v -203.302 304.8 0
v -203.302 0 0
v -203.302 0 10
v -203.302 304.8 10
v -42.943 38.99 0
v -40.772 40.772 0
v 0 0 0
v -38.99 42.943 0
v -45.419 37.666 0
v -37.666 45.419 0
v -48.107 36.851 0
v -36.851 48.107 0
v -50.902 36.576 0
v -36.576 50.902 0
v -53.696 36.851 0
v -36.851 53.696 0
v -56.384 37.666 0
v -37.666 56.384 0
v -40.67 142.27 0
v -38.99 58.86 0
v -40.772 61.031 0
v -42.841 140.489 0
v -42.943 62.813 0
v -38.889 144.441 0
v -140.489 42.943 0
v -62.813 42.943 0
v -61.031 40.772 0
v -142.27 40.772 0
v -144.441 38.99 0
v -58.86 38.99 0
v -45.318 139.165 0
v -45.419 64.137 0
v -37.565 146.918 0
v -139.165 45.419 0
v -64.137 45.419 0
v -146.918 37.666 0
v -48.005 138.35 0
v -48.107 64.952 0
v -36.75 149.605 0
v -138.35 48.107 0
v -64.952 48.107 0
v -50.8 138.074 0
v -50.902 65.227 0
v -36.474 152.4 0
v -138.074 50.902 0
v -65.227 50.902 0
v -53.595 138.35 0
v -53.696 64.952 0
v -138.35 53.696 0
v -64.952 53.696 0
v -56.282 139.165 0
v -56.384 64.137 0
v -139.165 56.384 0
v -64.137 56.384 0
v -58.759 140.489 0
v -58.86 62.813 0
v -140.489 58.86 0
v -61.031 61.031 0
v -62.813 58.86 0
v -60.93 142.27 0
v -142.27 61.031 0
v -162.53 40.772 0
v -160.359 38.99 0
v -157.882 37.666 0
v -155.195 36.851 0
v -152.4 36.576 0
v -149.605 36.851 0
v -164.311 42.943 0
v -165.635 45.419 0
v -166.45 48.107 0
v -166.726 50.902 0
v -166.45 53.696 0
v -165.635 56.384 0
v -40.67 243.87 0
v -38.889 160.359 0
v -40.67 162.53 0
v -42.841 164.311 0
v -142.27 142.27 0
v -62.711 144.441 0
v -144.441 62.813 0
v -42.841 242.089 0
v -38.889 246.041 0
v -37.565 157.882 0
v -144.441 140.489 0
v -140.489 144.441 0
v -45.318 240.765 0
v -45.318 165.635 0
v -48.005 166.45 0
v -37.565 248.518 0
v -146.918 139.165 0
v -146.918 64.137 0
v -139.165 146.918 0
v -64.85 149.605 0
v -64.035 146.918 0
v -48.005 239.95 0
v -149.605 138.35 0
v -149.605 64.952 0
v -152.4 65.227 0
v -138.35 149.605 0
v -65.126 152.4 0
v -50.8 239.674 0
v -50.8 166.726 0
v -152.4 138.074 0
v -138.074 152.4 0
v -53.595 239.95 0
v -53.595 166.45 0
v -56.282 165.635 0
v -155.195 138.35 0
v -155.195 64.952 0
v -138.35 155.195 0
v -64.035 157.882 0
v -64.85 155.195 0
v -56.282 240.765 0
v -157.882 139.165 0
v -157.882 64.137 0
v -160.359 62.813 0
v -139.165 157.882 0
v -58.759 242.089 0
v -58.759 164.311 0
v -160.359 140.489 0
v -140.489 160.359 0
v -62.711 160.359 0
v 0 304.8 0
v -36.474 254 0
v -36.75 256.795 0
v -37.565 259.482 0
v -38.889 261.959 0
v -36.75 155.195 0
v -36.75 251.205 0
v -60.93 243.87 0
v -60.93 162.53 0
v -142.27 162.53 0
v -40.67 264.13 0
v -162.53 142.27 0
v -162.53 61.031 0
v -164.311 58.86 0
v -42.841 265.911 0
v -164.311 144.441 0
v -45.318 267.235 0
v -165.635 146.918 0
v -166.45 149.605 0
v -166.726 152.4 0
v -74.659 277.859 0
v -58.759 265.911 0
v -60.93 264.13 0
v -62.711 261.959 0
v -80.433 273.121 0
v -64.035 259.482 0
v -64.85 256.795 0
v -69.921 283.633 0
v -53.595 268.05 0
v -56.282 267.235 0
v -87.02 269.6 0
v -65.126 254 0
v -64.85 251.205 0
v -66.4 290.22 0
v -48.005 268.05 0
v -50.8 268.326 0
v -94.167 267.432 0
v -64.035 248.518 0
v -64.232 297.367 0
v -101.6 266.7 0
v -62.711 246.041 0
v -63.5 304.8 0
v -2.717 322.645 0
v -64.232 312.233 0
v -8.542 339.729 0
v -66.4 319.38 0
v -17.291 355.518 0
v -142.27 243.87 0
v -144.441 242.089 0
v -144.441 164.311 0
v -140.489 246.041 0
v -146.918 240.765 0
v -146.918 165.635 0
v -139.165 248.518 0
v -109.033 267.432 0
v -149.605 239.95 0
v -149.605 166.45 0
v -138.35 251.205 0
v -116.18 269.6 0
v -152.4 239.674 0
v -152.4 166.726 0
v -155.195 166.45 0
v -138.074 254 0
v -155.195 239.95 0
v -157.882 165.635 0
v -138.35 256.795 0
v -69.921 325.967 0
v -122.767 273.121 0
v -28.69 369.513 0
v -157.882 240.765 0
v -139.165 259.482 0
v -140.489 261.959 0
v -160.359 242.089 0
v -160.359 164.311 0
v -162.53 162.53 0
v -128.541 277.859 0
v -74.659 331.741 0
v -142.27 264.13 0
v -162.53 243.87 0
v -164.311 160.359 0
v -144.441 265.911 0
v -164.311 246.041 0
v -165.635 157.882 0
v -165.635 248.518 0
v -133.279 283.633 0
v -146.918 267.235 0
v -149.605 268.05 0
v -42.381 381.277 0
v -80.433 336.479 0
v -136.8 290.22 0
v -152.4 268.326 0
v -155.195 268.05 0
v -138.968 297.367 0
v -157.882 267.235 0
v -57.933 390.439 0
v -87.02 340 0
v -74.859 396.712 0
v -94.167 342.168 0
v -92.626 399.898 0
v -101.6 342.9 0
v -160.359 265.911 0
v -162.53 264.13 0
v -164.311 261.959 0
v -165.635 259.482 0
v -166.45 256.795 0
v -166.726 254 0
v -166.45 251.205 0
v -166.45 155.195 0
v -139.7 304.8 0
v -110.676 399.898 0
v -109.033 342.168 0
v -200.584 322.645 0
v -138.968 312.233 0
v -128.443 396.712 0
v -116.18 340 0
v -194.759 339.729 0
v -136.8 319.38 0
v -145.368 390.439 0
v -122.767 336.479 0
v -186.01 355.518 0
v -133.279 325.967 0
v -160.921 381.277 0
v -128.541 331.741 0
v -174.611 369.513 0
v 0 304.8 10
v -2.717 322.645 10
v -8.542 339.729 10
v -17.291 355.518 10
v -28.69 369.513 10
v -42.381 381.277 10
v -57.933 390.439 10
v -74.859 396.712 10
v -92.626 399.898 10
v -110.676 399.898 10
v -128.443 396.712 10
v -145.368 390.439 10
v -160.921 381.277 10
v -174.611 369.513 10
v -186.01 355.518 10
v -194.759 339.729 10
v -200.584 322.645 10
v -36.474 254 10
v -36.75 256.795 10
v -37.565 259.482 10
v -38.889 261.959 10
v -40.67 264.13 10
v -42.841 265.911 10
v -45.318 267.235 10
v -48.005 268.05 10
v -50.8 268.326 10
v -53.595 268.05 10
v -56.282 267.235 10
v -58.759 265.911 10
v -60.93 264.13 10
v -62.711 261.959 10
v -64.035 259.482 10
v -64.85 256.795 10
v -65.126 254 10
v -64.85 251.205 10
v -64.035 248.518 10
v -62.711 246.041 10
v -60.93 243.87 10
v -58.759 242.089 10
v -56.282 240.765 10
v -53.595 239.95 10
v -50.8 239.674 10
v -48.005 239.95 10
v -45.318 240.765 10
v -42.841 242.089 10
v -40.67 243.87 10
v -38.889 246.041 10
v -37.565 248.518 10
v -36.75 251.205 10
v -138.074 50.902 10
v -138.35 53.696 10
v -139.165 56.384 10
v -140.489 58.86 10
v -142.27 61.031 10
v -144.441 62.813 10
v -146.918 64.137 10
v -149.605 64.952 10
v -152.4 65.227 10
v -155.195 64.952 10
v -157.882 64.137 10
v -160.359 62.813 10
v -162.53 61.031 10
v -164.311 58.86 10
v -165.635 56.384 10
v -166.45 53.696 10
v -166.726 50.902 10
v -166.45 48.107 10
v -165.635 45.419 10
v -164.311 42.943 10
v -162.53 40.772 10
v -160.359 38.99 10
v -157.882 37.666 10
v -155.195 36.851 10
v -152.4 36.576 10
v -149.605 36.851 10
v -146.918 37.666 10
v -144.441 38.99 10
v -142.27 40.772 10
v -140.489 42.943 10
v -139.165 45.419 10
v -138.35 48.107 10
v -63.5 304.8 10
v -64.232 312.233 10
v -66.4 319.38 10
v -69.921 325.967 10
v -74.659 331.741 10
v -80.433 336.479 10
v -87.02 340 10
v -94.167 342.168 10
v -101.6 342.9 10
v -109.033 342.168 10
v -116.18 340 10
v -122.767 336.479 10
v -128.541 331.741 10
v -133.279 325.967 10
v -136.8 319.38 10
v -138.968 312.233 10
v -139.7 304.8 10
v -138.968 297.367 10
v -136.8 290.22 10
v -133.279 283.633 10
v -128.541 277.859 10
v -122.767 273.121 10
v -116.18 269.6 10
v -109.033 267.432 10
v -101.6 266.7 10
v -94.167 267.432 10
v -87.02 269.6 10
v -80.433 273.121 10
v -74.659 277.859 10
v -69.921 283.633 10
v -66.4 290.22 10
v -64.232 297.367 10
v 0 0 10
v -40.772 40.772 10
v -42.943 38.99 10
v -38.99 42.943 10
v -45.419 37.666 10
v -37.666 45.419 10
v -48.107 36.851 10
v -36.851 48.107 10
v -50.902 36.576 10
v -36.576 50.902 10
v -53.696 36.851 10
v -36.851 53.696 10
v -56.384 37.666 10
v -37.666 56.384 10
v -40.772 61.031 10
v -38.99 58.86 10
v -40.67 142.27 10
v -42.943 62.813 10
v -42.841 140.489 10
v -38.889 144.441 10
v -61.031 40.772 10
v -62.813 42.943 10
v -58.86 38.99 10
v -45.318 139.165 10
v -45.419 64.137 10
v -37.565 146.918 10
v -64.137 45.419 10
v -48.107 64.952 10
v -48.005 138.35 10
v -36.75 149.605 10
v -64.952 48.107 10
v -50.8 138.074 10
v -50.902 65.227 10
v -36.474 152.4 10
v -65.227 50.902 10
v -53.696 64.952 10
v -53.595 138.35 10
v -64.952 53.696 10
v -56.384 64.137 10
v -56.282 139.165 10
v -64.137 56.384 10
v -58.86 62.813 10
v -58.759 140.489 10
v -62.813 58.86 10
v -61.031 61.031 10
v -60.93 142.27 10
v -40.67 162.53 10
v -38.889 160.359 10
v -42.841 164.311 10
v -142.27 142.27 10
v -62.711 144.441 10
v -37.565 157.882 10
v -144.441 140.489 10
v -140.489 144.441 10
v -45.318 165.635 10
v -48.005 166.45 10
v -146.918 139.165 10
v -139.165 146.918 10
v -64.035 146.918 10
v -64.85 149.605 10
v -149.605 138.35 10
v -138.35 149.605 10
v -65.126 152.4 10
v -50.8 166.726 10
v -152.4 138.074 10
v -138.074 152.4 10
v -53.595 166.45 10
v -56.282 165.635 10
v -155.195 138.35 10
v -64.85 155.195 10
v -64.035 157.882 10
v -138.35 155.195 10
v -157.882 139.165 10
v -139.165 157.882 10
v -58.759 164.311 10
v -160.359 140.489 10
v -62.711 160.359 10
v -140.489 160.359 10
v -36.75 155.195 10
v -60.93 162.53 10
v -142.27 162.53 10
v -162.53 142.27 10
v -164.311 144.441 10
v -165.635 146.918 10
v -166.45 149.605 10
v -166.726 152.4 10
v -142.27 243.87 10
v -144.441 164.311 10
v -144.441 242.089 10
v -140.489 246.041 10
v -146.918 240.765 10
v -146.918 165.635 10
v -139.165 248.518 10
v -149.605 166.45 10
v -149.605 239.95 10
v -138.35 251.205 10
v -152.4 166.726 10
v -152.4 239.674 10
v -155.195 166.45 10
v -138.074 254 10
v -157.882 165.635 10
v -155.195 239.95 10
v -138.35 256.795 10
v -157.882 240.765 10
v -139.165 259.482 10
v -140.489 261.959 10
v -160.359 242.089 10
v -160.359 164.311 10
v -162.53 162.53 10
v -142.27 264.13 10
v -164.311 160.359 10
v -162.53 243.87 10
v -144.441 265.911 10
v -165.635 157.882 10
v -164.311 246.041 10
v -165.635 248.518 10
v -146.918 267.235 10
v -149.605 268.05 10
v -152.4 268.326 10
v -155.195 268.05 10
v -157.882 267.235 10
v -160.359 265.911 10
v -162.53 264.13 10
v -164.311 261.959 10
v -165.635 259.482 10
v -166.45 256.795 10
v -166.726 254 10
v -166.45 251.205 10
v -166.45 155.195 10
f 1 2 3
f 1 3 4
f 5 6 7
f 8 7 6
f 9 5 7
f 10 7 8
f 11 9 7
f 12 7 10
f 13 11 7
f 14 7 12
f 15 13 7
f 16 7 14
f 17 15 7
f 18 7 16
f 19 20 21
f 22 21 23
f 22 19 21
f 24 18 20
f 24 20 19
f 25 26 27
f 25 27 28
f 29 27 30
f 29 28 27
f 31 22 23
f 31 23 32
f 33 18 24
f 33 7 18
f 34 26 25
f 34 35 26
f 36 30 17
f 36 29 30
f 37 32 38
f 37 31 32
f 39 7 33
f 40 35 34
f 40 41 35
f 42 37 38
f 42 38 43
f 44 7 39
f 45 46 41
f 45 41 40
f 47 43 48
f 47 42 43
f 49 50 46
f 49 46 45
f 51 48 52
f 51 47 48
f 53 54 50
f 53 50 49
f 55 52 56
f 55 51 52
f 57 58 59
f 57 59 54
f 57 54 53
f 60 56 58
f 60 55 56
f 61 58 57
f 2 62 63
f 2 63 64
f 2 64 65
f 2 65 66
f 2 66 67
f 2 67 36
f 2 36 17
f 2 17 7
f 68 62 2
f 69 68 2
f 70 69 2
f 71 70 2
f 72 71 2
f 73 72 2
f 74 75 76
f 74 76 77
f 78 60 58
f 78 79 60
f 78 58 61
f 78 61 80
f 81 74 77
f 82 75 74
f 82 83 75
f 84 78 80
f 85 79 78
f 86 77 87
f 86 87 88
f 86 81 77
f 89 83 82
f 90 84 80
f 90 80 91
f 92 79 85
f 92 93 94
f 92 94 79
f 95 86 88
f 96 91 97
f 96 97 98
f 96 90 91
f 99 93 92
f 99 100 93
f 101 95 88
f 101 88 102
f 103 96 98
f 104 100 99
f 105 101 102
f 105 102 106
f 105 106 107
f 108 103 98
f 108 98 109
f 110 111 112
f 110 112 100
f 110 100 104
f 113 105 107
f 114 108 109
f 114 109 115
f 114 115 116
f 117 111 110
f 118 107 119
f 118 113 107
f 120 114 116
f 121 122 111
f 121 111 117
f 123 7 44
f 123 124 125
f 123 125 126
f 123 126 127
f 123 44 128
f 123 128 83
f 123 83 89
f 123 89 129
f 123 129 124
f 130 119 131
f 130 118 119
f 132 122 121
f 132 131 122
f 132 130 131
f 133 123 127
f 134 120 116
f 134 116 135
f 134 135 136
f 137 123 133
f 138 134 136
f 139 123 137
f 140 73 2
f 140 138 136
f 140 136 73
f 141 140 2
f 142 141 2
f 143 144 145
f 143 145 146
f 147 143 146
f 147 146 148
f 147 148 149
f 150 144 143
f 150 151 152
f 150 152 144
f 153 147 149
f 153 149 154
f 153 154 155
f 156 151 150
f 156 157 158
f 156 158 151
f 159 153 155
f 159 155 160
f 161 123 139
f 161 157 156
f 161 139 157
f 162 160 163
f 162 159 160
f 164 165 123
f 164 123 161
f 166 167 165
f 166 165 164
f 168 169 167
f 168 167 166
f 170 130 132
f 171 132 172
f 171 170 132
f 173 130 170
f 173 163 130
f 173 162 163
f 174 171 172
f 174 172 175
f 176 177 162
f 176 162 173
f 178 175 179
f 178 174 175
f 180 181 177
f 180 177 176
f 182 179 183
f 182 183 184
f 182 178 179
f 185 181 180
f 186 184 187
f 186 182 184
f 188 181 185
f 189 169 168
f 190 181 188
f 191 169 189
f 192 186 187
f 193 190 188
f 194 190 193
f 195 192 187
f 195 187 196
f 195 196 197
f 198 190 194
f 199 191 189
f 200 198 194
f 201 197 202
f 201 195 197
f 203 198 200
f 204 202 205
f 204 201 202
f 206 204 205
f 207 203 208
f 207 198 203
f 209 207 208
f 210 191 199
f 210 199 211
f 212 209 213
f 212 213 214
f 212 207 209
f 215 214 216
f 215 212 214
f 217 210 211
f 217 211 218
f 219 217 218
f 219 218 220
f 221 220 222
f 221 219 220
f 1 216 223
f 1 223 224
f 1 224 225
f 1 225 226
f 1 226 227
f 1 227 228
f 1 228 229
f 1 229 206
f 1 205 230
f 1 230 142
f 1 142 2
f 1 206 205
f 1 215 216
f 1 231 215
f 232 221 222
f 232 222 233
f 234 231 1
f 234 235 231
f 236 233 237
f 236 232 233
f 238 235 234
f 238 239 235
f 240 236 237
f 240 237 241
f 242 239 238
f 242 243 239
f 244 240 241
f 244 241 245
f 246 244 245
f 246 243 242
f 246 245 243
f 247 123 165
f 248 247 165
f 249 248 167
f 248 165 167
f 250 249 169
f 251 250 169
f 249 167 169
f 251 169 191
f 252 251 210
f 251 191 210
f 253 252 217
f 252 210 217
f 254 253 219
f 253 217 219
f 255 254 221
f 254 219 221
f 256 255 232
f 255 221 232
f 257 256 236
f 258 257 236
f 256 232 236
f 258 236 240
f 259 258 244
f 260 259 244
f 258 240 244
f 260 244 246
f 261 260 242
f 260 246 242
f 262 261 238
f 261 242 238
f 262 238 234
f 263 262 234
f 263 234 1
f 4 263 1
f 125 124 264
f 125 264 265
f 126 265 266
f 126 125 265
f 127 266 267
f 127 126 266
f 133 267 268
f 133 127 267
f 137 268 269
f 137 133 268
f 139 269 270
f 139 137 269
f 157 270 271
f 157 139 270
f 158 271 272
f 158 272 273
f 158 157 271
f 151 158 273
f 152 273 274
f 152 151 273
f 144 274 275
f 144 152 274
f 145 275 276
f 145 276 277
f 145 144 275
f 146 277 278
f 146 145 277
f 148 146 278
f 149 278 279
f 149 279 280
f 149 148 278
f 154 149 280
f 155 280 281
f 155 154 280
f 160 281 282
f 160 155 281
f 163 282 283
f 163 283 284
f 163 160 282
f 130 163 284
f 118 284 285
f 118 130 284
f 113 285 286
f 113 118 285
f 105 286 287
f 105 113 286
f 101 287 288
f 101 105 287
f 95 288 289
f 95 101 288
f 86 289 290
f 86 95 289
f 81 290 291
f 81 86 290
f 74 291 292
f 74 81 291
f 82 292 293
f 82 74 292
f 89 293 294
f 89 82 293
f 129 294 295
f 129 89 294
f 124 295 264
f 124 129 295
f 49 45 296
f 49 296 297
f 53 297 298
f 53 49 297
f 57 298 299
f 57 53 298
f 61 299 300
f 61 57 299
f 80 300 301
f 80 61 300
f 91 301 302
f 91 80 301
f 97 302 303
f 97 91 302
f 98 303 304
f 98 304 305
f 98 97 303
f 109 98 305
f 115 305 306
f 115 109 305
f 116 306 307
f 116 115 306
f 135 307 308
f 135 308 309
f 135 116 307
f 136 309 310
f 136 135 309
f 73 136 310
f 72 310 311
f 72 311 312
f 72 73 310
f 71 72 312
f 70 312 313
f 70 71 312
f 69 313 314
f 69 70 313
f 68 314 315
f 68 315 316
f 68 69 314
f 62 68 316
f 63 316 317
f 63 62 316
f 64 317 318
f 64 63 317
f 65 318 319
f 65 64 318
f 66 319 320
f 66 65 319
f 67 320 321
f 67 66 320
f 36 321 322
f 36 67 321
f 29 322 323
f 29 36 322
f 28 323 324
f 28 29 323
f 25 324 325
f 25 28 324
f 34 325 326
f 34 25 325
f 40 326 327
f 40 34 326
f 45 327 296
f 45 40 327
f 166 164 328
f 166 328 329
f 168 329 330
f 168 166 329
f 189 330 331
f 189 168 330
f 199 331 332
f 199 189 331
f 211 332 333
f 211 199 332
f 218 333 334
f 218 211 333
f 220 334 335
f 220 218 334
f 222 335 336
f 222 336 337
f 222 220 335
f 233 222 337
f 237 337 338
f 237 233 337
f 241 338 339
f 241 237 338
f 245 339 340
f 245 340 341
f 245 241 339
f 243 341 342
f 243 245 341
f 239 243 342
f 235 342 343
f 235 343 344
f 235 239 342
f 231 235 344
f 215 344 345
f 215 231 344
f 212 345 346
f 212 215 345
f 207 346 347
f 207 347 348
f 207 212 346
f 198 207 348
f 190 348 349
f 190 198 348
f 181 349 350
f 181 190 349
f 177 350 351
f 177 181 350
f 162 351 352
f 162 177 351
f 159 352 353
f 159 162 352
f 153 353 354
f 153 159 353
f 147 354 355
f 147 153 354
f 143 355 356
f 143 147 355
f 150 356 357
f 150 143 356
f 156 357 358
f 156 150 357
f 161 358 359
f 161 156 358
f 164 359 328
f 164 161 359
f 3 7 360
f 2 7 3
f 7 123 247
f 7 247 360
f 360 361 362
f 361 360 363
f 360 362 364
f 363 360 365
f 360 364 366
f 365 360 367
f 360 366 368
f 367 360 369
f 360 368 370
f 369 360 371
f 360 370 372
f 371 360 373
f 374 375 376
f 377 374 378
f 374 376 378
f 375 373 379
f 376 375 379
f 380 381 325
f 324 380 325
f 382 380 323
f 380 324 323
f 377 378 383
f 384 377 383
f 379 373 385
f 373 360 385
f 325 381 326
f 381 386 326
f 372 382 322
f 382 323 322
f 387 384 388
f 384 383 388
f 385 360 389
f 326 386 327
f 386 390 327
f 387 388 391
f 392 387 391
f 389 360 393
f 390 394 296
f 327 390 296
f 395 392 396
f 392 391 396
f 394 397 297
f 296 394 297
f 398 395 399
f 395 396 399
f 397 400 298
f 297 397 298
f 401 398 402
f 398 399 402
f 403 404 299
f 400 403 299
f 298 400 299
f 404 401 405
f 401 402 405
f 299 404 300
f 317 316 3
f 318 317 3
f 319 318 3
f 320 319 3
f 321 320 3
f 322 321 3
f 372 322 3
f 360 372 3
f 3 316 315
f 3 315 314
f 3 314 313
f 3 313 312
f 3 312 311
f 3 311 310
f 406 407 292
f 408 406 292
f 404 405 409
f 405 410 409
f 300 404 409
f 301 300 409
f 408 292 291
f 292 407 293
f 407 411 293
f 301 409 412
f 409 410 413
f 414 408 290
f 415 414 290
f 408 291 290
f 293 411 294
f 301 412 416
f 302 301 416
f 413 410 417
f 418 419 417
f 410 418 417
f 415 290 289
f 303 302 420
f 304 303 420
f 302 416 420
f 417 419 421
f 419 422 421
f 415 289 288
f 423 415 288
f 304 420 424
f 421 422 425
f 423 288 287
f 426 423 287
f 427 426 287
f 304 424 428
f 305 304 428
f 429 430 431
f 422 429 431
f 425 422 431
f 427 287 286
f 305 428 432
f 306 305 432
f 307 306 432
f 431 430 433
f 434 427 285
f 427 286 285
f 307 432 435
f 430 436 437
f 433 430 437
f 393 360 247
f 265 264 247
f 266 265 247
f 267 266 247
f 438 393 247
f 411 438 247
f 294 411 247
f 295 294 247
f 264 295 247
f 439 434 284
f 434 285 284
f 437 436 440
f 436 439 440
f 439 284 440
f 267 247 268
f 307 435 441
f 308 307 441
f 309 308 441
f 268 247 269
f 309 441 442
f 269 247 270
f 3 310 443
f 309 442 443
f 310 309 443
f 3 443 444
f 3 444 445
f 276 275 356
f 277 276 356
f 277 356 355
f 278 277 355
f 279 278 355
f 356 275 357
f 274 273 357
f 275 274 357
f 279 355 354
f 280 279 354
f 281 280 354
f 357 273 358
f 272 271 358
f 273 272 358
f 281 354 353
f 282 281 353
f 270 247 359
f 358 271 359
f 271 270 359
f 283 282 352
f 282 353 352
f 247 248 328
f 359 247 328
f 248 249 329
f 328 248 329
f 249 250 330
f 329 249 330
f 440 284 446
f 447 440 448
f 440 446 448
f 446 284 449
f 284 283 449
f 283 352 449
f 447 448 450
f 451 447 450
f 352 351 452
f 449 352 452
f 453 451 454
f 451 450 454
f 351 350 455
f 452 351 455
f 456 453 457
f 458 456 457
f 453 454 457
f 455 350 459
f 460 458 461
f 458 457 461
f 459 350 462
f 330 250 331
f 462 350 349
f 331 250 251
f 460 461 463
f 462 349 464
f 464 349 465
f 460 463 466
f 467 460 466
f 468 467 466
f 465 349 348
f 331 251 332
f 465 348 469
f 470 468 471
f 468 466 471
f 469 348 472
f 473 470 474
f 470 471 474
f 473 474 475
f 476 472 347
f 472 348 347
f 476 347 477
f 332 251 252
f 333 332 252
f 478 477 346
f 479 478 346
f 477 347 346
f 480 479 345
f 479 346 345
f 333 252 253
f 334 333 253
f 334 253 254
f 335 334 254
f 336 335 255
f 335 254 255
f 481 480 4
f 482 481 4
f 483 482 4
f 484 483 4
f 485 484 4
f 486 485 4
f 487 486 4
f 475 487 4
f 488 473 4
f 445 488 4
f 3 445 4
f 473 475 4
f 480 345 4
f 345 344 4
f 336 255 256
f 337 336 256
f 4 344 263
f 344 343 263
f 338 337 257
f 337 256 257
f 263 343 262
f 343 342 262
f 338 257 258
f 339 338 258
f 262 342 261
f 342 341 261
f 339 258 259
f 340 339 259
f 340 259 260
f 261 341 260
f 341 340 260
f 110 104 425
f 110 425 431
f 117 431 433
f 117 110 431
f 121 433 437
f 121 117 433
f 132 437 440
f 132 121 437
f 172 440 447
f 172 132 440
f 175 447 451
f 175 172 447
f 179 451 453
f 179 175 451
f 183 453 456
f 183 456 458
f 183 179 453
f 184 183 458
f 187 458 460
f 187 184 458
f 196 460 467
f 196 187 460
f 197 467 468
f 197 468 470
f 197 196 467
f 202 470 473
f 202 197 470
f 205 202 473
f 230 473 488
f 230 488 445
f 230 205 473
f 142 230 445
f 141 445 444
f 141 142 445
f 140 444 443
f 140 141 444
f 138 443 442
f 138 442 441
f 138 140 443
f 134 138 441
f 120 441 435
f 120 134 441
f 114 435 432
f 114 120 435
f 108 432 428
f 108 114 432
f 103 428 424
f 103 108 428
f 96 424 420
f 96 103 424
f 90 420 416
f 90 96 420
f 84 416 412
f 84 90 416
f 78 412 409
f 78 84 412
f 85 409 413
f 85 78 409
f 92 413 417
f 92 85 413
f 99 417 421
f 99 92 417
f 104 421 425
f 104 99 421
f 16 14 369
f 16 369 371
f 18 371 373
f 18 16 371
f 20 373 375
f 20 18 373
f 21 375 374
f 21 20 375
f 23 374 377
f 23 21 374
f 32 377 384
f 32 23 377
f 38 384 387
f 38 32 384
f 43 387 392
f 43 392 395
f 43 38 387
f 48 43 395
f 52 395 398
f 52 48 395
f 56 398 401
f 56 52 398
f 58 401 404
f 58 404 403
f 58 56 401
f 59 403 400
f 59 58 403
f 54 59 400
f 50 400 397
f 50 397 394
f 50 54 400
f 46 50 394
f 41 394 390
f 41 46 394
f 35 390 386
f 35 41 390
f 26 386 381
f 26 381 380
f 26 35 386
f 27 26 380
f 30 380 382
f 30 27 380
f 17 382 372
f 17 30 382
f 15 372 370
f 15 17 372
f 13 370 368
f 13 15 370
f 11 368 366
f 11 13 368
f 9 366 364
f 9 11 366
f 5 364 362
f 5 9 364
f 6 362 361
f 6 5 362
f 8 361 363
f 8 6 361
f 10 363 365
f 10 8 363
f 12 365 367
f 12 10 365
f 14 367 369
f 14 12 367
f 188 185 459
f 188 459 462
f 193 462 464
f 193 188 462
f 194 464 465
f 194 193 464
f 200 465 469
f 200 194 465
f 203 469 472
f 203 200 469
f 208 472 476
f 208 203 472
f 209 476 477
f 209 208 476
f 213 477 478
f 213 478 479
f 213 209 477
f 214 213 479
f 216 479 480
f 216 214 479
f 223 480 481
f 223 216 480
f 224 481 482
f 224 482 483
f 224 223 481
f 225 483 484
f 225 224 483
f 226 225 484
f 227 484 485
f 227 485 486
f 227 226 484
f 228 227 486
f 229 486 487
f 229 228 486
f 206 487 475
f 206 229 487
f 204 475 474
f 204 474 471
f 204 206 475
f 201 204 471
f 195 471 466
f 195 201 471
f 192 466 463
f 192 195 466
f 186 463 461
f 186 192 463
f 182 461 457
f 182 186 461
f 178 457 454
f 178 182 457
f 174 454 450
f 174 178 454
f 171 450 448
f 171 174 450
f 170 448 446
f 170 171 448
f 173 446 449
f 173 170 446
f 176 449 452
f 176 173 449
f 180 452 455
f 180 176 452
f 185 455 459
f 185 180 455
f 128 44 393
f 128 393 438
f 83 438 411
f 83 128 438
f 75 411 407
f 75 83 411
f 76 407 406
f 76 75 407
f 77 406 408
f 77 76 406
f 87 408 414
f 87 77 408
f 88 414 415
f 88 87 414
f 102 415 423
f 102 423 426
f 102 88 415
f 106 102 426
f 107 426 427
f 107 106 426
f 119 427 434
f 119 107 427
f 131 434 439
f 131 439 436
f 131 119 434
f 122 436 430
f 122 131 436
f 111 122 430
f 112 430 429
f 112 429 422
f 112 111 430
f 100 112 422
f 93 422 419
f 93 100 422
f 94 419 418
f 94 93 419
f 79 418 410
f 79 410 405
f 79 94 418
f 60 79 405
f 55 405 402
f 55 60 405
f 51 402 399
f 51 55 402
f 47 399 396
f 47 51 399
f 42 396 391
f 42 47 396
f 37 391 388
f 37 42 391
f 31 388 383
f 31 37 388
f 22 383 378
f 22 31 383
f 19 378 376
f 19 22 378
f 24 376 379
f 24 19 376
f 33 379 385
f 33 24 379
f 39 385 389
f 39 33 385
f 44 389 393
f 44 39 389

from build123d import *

# Parameters (mm, degrees)
SKETCH_R   = 14.3256
SKETCH_R_2 = 38.1
PAD_DEPTH  = 10.000005


with BuildPart() as part:
    # Sketch → Pad (new body)
    with BuildSketch(Plane.XY):
        with BuildLine():
            Line((0, 304.8), (0, 0))
            Line((0, 0), (-203.3016, 0))
            Line((-203.3016, 0), (-203.3016, 304.8))
            ThreePointArc((0, 304.8), (-101.6508, 400.298945), (-203.3016, 304.8))
        make_face()
        with Locations((-152.4, 50.9016)):
            Circle(SKETCH_R, mode=Mode.SUBTRACT)
        with Locations((-50.9016, 50.9016)):
            Circle(SKETCH_R, mode=Mode.SUBTRACT)
        with Locations((-152.4, 152.4)):
            Circle(SKETCH_R, mode=Mode.SUBTRACT)
        with Locations((-50.8, 152.4)):
            Circle(SKETCH_R, mode=Mode.SUBTRACT)
        with Locations((-152.4, 254)):
            Circle(SKETCH_R, mode=Mode.SUBTRACT)
        with Locations((-50.8, 254)):
            Circle(SKETCH_R, mode=Mode.SUBTRACT)
        with Locations((-101.6, 304.8)):
            Circle(SKETCH_R_2, mode=Mode.SUBTRACT)
    extrude(amount=PAD_DEPTH)


solid = part.part
